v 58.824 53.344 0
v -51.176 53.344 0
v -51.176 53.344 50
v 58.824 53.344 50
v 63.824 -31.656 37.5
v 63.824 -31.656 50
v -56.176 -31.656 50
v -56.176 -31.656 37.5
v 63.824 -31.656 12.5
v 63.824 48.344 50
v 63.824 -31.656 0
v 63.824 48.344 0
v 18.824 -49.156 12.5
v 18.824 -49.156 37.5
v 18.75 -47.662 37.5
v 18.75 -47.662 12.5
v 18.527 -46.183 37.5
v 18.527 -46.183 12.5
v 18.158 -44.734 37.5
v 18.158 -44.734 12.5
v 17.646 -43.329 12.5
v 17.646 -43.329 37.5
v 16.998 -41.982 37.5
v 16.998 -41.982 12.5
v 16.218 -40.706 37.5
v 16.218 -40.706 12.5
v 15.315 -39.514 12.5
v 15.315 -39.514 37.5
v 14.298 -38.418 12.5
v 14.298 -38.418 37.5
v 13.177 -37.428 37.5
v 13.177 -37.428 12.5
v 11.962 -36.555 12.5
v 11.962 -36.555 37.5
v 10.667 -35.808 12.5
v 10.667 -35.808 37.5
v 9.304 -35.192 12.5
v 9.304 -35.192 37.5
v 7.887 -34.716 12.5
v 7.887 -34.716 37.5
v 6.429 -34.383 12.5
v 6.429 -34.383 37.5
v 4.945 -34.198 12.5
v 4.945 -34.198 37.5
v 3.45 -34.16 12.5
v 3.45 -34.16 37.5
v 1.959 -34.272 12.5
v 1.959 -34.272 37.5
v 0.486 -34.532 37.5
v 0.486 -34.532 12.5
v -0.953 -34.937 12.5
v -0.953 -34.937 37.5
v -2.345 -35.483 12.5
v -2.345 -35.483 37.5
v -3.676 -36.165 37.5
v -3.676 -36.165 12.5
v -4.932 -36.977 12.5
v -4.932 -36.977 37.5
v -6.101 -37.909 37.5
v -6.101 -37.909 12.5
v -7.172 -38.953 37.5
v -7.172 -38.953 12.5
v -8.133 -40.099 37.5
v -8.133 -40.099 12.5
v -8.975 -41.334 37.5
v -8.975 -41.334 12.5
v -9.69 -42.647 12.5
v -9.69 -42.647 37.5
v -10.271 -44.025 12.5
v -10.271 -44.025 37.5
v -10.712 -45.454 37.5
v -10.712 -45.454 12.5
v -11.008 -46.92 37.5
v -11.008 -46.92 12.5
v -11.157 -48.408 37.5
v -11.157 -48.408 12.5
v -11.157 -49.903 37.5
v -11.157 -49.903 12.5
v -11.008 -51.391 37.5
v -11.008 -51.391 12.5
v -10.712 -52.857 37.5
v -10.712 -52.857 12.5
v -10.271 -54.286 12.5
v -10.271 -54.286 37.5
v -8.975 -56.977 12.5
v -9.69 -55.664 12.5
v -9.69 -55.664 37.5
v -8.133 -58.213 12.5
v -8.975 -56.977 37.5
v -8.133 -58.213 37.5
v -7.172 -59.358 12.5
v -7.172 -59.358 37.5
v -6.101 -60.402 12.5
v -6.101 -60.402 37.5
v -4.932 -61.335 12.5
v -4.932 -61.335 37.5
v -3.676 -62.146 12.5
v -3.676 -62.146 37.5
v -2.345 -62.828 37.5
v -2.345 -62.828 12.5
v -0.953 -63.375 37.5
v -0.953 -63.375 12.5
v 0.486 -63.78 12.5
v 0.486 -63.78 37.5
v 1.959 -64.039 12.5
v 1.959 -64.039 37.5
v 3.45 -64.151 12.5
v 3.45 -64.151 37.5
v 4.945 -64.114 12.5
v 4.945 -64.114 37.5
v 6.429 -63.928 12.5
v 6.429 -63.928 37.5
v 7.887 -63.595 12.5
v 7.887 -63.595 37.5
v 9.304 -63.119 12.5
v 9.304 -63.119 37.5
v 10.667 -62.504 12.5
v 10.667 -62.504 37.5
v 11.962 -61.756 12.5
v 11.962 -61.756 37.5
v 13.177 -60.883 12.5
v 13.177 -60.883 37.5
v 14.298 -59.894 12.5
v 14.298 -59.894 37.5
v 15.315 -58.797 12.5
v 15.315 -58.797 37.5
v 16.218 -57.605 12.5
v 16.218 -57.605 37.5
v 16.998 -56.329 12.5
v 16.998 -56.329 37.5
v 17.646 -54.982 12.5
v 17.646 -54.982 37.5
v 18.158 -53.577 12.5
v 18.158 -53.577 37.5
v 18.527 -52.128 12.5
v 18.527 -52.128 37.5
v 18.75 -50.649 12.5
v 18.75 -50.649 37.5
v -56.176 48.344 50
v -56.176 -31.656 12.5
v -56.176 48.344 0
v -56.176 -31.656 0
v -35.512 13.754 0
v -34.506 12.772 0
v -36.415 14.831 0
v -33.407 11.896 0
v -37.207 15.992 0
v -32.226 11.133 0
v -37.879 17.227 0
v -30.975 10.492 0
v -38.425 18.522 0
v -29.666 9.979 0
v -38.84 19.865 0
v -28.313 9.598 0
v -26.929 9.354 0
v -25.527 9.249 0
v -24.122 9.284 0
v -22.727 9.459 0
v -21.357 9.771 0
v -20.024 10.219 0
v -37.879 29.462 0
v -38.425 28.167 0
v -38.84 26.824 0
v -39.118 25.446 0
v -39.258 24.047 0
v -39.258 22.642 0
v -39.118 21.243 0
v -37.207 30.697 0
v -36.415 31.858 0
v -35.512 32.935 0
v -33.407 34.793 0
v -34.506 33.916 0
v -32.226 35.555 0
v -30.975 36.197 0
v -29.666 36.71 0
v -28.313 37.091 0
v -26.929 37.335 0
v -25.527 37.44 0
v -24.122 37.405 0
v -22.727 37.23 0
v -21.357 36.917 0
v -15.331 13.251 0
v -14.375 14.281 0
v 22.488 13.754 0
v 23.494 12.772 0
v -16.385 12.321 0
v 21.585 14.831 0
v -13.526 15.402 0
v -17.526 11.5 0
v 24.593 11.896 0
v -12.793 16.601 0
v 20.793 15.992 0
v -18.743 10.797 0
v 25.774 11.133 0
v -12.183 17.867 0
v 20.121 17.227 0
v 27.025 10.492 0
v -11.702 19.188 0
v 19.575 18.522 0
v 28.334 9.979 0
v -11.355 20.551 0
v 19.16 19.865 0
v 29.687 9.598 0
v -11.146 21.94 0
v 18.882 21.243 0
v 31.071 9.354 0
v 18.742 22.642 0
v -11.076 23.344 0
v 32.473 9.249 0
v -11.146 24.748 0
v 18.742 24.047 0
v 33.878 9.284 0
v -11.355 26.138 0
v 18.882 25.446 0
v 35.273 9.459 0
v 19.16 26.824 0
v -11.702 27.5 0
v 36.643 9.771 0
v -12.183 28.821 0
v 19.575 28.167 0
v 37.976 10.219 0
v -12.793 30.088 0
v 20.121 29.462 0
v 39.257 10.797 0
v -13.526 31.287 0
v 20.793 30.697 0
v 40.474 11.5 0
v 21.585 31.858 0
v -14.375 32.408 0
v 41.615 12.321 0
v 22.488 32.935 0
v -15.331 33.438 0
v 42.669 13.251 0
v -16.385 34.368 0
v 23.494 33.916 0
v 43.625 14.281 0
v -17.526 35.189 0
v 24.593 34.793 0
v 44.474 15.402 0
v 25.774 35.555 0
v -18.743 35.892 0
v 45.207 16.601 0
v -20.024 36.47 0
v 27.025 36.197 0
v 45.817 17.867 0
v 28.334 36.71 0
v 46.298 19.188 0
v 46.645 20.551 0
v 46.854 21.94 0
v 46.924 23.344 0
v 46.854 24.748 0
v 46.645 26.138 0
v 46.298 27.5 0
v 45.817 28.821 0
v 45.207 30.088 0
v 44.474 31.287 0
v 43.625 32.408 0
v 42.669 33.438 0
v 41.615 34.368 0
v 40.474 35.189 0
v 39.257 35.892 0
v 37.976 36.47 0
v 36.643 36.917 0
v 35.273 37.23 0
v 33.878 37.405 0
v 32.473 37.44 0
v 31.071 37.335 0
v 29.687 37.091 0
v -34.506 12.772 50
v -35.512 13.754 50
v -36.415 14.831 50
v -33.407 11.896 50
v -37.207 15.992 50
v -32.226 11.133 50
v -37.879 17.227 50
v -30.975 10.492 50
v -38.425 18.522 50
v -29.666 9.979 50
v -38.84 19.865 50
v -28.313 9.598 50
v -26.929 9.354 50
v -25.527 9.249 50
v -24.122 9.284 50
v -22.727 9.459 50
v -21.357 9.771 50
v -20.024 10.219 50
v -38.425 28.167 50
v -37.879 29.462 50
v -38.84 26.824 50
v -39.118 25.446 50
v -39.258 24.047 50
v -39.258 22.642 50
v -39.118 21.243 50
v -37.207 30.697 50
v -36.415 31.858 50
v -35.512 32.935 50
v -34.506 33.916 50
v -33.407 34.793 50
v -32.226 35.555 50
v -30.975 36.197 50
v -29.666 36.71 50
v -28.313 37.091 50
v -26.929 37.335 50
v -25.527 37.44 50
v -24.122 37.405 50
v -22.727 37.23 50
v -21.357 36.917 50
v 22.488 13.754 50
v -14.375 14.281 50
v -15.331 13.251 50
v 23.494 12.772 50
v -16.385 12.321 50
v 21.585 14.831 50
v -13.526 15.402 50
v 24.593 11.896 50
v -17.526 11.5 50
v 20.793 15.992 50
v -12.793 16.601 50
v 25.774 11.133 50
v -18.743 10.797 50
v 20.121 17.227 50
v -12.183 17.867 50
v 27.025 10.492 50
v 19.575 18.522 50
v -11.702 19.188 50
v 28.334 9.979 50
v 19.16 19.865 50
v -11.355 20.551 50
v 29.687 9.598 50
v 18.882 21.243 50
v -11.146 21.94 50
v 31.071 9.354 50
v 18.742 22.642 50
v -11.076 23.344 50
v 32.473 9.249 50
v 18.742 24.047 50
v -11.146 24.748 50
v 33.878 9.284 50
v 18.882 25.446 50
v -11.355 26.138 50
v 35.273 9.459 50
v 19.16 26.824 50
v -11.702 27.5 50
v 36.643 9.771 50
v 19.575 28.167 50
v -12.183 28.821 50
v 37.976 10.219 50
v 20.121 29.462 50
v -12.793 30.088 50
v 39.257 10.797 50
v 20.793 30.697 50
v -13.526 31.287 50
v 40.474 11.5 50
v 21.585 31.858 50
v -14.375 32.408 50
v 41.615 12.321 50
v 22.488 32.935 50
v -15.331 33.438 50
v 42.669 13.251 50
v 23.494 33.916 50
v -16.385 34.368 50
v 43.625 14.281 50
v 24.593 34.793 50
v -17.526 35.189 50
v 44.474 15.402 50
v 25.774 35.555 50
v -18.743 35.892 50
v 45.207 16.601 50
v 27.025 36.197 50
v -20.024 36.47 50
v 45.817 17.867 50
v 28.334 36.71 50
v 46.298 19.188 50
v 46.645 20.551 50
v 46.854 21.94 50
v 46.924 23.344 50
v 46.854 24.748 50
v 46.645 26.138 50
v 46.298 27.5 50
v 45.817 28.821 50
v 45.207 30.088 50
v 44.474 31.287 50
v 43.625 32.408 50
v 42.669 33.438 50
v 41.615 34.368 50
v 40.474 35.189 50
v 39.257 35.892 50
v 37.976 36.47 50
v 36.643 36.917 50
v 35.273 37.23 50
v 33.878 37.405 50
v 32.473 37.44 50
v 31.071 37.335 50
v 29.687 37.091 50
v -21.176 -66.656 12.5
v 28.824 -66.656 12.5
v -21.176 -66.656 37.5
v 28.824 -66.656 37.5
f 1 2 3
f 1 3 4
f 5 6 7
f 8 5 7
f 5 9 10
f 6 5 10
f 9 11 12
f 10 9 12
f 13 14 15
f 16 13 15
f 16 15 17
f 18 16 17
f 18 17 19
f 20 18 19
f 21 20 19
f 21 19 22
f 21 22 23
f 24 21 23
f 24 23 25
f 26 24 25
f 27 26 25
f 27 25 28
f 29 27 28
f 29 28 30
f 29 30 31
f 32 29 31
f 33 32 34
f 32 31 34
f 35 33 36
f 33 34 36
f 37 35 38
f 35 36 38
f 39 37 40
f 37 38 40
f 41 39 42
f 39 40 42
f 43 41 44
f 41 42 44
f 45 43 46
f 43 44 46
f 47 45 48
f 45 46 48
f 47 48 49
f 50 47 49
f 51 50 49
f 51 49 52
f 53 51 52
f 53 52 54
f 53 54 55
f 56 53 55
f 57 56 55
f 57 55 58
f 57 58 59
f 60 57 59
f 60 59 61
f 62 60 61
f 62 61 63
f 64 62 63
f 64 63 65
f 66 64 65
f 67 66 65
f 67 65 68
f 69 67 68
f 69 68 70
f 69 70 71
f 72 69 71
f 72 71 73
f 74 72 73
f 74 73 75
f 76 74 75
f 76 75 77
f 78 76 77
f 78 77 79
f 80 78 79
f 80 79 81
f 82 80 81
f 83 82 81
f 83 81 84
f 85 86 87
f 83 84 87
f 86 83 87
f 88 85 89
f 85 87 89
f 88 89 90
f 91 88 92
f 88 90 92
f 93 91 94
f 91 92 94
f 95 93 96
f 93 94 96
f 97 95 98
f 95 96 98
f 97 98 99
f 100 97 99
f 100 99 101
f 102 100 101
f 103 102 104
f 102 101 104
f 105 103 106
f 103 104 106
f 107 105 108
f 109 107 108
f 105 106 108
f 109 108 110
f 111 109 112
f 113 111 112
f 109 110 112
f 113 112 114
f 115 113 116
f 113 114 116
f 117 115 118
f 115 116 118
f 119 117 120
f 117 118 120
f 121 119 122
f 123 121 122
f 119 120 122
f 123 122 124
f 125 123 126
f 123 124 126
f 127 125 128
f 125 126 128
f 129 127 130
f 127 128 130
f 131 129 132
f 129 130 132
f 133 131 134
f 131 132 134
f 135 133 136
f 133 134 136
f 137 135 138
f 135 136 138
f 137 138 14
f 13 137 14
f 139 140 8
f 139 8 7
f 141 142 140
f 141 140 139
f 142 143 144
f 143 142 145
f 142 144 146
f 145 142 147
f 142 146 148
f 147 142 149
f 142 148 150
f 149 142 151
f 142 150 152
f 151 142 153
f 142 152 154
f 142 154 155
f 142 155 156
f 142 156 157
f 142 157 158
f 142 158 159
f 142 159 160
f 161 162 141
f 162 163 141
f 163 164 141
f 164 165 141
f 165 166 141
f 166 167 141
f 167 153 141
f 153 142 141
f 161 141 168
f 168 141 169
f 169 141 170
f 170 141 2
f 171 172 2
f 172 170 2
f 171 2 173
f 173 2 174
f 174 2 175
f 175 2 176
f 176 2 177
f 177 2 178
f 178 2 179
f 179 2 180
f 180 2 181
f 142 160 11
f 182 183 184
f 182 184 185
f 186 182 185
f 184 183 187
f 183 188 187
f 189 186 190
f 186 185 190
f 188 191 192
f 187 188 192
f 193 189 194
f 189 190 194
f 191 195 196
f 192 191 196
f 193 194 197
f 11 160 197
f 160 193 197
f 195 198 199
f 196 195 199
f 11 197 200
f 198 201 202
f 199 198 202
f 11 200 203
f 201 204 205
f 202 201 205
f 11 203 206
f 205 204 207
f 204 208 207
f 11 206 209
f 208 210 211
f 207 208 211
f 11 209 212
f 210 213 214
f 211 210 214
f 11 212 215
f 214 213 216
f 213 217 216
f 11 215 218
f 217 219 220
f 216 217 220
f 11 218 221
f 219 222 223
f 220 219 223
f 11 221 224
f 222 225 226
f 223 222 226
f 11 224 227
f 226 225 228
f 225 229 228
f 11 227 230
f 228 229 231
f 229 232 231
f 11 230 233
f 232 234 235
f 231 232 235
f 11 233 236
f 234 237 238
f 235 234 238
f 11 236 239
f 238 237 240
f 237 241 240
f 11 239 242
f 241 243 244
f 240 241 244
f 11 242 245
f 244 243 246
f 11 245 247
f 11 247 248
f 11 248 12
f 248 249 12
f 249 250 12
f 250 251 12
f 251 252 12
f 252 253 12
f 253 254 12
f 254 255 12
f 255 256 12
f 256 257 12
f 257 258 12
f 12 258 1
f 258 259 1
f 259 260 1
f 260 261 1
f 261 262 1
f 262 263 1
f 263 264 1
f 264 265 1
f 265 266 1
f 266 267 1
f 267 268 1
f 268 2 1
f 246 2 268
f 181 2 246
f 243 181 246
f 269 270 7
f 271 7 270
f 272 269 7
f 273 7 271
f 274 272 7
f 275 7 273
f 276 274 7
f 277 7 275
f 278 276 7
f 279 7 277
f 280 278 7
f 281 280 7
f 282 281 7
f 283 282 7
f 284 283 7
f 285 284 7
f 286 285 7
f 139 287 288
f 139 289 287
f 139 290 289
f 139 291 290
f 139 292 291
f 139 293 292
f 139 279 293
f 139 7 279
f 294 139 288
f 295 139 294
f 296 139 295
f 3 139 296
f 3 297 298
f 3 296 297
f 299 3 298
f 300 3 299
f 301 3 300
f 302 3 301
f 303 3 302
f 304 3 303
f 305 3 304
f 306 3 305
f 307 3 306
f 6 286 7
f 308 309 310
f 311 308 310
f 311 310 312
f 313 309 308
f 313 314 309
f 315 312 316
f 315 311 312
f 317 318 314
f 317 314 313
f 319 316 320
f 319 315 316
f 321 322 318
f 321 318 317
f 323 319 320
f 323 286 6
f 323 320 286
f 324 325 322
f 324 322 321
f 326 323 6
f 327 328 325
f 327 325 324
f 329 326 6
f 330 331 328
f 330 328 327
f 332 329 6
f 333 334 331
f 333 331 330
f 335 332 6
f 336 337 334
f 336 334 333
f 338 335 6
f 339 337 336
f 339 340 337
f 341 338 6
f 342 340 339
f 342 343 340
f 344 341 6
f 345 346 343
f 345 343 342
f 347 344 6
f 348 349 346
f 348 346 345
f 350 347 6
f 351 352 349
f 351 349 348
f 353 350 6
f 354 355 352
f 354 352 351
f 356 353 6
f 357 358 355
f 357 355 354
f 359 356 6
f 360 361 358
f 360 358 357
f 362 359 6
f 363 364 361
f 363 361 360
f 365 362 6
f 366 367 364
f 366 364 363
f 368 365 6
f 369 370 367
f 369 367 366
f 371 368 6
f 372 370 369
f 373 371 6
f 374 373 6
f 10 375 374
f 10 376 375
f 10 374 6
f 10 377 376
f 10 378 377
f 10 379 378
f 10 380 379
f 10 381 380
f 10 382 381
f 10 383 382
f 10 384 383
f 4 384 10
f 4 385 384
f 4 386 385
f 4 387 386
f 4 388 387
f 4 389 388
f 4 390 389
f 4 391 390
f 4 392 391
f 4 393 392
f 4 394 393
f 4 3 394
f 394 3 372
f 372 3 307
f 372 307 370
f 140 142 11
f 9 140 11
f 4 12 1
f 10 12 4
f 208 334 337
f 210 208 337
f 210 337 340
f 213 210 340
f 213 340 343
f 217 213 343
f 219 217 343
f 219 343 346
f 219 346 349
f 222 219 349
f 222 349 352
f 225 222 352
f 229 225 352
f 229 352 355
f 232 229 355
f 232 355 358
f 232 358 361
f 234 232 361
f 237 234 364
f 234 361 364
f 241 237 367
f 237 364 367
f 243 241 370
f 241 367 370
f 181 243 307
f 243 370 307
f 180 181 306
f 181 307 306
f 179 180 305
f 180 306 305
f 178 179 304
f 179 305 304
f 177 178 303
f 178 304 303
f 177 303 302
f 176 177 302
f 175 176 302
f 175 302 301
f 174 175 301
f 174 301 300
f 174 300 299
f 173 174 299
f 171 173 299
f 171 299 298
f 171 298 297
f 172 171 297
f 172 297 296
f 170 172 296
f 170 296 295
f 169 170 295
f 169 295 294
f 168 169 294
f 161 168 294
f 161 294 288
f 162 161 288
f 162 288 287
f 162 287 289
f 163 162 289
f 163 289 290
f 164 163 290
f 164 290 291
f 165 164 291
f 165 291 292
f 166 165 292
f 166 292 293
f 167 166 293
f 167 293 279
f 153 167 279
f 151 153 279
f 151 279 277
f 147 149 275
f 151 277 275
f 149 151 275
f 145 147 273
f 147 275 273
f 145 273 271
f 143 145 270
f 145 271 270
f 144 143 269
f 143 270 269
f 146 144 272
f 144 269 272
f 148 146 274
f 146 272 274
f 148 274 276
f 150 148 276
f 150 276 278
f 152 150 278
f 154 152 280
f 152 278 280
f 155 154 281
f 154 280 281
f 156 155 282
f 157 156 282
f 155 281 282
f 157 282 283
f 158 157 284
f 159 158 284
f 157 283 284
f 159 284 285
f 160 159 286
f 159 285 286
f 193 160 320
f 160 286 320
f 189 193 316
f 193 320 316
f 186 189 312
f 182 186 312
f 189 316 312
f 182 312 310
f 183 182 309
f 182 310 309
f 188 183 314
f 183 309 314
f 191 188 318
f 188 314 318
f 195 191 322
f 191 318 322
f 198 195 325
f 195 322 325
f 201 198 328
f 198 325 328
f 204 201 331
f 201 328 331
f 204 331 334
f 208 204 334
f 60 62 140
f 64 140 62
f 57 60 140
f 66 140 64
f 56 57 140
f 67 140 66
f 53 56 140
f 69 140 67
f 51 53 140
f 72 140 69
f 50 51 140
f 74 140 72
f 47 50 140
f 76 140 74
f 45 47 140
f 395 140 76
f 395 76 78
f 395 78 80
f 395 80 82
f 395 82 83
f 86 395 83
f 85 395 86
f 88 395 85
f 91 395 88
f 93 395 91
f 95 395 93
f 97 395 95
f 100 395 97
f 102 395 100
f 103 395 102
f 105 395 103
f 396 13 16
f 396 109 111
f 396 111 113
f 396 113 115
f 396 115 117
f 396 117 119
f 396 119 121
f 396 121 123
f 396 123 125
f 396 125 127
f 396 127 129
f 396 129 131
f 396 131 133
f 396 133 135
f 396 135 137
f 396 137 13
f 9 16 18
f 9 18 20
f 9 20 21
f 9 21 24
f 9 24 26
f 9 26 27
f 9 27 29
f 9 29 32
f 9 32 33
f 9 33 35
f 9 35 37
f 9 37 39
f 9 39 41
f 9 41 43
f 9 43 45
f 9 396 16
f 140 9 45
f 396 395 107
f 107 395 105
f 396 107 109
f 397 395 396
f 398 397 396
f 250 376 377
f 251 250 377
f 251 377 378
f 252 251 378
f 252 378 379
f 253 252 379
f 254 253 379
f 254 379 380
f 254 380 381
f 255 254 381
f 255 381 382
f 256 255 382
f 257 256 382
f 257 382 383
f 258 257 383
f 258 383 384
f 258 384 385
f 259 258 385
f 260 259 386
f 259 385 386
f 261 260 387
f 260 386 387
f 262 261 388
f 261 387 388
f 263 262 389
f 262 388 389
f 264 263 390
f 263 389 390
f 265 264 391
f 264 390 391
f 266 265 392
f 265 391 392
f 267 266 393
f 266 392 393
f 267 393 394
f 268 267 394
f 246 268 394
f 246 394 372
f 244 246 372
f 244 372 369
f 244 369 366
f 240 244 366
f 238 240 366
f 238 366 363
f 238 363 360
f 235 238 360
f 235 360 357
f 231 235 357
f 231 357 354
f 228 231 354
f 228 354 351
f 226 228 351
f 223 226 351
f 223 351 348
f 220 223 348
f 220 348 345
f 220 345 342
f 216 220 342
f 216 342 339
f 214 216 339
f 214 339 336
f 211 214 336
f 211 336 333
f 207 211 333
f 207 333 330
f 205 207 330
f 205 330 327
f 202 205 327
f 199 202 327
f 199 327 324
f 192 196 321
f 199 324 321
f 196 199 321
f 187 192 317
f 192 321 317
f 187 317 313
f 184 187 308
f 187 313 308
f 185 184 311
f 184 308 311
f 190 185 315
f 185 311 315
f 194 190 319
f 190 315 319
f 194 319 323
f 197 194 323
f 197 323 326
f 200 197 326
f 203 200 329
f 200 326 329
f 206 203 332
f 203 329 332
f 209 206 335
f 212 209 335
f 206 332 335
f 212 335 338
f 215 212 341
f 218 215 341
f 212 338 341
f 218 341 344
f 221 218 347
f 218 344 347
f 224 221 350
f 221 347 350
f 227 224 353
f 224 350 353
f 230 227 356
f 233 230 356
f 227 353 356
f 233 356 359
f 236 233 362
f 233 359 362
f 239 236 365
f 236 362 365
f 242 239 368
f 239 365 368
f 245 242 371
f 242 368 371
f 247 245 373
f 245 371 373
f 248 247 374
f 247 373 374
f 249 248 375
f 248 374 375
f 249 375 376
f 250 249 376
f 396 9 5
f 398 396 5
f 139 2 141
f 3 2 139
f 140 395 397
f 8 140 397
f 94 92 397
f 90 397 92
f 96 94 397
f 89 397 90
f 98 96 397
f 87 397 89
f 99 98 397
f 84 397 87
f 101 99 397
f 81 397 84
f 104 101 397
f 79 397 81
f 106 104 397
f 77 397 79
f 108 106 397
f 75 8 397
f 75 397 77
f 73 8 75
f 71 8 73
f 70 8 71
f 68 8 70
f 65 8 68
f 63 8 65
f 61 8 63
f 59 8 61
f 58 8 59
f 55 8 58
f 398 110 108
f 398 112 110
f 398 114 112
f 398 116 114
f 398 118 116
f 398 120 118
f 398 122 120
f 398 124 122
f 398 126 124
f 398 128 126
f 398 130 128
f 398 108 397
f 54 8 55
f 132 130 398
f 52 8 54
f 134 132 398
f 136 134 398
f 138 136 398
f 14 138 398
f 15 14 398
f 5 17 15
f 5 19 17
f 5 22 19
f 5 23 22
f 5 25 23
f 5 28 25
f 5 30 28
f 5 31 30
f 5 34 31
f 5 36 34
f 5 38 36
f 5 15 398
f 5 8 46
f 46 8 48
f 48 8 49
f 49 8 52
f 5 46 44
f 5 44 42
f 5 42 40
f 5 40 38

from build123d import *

# Parameters (mm, degrees)
F0_W      = 120
F0_H      = 120
F1_DEPTH  = 50
F2_SIZE   = 35
F4_DEPTH  = 12.5
F6_DEPTH  = 12.5
F7_R      = 15
F8_DEPTH  = 37.501
F9_R      = 14.1
F10_DEPTH = 50.001
F11_SIZE  = 5


with BuildPart() as f1:
    # F0 (on Top) → F1 (new body)
    with BuildSketch(Plane.XY):
        with Locations((3.824193, -6.655599)):
            Rectangle(F0_W, F0_H)
    extrude(amount=F1_DEPTH)

    # F2
    f2_edges = [f1.edges().sort_by_distance(p)[0] for p in [
        (-56.175807, -66.655599, 25),
        (63.824193, -66.655599, 25),
    ]]
    chamfer(f2_edges, length=F2_SIZE)

    # F3 (on face) → F4 (cut)
    with BuildSketch(Plane.XY.offset(50)):
        Polygon((63.824193, -31.655599), (-56.175807, -31.655599), (-21.175807, -66.655599), (28.824193, -66.655599), align=None)
    extrude(amount=-F4_DEPTH, mode=Mode.SUBTRACT)

    # F5 (on face) → F6 (cut)
    with BuildSketch(Plane(origin=(0, 0, 0), x_dir=(1, 0, 0), z_dir=(0, 0, -1))):
        Polygon((-56.175807, 31.655599), (63.824193, 31.655599), (28.824193, 66.655599), (-21.175807, 66.655599), align=None)
    extrude(amount=-F6_DEPTH, mode=Mode.SUBTRACT)

    # F7 (on face) → F8 (cut, through all)
    with BuildSketch(Plane.XY.offset(37.5)):
        with Locations((3.824193, -49.155599)):
            Circle(F7_R)
    extrude(amount=-F8_DEPTH, mode=Mode.SUBTRACT)

    # F9 (on face) → F10 (cut, through all)
    with BuildSketch(Plane.XY.offset(50)):
        with Locations((-25.175807, 23.344401)):
            Circle(F9_R)
        with Locations((32.824193, 23.344401)):
            Circle(F9_R)
    extrude(amount=-F10_DEPTH, mode=Mode.SUBTRACT)

    # F11
    f11_edges = [f1.edges().sort_by_distance(p)[0] for p in [
        (63.824193, 53.344401, 25),
        (-56.175807, 53.344401, 25),
    ]]
    chamfer(f11_edges, length=F11_SIZE)


solid = f1.part
